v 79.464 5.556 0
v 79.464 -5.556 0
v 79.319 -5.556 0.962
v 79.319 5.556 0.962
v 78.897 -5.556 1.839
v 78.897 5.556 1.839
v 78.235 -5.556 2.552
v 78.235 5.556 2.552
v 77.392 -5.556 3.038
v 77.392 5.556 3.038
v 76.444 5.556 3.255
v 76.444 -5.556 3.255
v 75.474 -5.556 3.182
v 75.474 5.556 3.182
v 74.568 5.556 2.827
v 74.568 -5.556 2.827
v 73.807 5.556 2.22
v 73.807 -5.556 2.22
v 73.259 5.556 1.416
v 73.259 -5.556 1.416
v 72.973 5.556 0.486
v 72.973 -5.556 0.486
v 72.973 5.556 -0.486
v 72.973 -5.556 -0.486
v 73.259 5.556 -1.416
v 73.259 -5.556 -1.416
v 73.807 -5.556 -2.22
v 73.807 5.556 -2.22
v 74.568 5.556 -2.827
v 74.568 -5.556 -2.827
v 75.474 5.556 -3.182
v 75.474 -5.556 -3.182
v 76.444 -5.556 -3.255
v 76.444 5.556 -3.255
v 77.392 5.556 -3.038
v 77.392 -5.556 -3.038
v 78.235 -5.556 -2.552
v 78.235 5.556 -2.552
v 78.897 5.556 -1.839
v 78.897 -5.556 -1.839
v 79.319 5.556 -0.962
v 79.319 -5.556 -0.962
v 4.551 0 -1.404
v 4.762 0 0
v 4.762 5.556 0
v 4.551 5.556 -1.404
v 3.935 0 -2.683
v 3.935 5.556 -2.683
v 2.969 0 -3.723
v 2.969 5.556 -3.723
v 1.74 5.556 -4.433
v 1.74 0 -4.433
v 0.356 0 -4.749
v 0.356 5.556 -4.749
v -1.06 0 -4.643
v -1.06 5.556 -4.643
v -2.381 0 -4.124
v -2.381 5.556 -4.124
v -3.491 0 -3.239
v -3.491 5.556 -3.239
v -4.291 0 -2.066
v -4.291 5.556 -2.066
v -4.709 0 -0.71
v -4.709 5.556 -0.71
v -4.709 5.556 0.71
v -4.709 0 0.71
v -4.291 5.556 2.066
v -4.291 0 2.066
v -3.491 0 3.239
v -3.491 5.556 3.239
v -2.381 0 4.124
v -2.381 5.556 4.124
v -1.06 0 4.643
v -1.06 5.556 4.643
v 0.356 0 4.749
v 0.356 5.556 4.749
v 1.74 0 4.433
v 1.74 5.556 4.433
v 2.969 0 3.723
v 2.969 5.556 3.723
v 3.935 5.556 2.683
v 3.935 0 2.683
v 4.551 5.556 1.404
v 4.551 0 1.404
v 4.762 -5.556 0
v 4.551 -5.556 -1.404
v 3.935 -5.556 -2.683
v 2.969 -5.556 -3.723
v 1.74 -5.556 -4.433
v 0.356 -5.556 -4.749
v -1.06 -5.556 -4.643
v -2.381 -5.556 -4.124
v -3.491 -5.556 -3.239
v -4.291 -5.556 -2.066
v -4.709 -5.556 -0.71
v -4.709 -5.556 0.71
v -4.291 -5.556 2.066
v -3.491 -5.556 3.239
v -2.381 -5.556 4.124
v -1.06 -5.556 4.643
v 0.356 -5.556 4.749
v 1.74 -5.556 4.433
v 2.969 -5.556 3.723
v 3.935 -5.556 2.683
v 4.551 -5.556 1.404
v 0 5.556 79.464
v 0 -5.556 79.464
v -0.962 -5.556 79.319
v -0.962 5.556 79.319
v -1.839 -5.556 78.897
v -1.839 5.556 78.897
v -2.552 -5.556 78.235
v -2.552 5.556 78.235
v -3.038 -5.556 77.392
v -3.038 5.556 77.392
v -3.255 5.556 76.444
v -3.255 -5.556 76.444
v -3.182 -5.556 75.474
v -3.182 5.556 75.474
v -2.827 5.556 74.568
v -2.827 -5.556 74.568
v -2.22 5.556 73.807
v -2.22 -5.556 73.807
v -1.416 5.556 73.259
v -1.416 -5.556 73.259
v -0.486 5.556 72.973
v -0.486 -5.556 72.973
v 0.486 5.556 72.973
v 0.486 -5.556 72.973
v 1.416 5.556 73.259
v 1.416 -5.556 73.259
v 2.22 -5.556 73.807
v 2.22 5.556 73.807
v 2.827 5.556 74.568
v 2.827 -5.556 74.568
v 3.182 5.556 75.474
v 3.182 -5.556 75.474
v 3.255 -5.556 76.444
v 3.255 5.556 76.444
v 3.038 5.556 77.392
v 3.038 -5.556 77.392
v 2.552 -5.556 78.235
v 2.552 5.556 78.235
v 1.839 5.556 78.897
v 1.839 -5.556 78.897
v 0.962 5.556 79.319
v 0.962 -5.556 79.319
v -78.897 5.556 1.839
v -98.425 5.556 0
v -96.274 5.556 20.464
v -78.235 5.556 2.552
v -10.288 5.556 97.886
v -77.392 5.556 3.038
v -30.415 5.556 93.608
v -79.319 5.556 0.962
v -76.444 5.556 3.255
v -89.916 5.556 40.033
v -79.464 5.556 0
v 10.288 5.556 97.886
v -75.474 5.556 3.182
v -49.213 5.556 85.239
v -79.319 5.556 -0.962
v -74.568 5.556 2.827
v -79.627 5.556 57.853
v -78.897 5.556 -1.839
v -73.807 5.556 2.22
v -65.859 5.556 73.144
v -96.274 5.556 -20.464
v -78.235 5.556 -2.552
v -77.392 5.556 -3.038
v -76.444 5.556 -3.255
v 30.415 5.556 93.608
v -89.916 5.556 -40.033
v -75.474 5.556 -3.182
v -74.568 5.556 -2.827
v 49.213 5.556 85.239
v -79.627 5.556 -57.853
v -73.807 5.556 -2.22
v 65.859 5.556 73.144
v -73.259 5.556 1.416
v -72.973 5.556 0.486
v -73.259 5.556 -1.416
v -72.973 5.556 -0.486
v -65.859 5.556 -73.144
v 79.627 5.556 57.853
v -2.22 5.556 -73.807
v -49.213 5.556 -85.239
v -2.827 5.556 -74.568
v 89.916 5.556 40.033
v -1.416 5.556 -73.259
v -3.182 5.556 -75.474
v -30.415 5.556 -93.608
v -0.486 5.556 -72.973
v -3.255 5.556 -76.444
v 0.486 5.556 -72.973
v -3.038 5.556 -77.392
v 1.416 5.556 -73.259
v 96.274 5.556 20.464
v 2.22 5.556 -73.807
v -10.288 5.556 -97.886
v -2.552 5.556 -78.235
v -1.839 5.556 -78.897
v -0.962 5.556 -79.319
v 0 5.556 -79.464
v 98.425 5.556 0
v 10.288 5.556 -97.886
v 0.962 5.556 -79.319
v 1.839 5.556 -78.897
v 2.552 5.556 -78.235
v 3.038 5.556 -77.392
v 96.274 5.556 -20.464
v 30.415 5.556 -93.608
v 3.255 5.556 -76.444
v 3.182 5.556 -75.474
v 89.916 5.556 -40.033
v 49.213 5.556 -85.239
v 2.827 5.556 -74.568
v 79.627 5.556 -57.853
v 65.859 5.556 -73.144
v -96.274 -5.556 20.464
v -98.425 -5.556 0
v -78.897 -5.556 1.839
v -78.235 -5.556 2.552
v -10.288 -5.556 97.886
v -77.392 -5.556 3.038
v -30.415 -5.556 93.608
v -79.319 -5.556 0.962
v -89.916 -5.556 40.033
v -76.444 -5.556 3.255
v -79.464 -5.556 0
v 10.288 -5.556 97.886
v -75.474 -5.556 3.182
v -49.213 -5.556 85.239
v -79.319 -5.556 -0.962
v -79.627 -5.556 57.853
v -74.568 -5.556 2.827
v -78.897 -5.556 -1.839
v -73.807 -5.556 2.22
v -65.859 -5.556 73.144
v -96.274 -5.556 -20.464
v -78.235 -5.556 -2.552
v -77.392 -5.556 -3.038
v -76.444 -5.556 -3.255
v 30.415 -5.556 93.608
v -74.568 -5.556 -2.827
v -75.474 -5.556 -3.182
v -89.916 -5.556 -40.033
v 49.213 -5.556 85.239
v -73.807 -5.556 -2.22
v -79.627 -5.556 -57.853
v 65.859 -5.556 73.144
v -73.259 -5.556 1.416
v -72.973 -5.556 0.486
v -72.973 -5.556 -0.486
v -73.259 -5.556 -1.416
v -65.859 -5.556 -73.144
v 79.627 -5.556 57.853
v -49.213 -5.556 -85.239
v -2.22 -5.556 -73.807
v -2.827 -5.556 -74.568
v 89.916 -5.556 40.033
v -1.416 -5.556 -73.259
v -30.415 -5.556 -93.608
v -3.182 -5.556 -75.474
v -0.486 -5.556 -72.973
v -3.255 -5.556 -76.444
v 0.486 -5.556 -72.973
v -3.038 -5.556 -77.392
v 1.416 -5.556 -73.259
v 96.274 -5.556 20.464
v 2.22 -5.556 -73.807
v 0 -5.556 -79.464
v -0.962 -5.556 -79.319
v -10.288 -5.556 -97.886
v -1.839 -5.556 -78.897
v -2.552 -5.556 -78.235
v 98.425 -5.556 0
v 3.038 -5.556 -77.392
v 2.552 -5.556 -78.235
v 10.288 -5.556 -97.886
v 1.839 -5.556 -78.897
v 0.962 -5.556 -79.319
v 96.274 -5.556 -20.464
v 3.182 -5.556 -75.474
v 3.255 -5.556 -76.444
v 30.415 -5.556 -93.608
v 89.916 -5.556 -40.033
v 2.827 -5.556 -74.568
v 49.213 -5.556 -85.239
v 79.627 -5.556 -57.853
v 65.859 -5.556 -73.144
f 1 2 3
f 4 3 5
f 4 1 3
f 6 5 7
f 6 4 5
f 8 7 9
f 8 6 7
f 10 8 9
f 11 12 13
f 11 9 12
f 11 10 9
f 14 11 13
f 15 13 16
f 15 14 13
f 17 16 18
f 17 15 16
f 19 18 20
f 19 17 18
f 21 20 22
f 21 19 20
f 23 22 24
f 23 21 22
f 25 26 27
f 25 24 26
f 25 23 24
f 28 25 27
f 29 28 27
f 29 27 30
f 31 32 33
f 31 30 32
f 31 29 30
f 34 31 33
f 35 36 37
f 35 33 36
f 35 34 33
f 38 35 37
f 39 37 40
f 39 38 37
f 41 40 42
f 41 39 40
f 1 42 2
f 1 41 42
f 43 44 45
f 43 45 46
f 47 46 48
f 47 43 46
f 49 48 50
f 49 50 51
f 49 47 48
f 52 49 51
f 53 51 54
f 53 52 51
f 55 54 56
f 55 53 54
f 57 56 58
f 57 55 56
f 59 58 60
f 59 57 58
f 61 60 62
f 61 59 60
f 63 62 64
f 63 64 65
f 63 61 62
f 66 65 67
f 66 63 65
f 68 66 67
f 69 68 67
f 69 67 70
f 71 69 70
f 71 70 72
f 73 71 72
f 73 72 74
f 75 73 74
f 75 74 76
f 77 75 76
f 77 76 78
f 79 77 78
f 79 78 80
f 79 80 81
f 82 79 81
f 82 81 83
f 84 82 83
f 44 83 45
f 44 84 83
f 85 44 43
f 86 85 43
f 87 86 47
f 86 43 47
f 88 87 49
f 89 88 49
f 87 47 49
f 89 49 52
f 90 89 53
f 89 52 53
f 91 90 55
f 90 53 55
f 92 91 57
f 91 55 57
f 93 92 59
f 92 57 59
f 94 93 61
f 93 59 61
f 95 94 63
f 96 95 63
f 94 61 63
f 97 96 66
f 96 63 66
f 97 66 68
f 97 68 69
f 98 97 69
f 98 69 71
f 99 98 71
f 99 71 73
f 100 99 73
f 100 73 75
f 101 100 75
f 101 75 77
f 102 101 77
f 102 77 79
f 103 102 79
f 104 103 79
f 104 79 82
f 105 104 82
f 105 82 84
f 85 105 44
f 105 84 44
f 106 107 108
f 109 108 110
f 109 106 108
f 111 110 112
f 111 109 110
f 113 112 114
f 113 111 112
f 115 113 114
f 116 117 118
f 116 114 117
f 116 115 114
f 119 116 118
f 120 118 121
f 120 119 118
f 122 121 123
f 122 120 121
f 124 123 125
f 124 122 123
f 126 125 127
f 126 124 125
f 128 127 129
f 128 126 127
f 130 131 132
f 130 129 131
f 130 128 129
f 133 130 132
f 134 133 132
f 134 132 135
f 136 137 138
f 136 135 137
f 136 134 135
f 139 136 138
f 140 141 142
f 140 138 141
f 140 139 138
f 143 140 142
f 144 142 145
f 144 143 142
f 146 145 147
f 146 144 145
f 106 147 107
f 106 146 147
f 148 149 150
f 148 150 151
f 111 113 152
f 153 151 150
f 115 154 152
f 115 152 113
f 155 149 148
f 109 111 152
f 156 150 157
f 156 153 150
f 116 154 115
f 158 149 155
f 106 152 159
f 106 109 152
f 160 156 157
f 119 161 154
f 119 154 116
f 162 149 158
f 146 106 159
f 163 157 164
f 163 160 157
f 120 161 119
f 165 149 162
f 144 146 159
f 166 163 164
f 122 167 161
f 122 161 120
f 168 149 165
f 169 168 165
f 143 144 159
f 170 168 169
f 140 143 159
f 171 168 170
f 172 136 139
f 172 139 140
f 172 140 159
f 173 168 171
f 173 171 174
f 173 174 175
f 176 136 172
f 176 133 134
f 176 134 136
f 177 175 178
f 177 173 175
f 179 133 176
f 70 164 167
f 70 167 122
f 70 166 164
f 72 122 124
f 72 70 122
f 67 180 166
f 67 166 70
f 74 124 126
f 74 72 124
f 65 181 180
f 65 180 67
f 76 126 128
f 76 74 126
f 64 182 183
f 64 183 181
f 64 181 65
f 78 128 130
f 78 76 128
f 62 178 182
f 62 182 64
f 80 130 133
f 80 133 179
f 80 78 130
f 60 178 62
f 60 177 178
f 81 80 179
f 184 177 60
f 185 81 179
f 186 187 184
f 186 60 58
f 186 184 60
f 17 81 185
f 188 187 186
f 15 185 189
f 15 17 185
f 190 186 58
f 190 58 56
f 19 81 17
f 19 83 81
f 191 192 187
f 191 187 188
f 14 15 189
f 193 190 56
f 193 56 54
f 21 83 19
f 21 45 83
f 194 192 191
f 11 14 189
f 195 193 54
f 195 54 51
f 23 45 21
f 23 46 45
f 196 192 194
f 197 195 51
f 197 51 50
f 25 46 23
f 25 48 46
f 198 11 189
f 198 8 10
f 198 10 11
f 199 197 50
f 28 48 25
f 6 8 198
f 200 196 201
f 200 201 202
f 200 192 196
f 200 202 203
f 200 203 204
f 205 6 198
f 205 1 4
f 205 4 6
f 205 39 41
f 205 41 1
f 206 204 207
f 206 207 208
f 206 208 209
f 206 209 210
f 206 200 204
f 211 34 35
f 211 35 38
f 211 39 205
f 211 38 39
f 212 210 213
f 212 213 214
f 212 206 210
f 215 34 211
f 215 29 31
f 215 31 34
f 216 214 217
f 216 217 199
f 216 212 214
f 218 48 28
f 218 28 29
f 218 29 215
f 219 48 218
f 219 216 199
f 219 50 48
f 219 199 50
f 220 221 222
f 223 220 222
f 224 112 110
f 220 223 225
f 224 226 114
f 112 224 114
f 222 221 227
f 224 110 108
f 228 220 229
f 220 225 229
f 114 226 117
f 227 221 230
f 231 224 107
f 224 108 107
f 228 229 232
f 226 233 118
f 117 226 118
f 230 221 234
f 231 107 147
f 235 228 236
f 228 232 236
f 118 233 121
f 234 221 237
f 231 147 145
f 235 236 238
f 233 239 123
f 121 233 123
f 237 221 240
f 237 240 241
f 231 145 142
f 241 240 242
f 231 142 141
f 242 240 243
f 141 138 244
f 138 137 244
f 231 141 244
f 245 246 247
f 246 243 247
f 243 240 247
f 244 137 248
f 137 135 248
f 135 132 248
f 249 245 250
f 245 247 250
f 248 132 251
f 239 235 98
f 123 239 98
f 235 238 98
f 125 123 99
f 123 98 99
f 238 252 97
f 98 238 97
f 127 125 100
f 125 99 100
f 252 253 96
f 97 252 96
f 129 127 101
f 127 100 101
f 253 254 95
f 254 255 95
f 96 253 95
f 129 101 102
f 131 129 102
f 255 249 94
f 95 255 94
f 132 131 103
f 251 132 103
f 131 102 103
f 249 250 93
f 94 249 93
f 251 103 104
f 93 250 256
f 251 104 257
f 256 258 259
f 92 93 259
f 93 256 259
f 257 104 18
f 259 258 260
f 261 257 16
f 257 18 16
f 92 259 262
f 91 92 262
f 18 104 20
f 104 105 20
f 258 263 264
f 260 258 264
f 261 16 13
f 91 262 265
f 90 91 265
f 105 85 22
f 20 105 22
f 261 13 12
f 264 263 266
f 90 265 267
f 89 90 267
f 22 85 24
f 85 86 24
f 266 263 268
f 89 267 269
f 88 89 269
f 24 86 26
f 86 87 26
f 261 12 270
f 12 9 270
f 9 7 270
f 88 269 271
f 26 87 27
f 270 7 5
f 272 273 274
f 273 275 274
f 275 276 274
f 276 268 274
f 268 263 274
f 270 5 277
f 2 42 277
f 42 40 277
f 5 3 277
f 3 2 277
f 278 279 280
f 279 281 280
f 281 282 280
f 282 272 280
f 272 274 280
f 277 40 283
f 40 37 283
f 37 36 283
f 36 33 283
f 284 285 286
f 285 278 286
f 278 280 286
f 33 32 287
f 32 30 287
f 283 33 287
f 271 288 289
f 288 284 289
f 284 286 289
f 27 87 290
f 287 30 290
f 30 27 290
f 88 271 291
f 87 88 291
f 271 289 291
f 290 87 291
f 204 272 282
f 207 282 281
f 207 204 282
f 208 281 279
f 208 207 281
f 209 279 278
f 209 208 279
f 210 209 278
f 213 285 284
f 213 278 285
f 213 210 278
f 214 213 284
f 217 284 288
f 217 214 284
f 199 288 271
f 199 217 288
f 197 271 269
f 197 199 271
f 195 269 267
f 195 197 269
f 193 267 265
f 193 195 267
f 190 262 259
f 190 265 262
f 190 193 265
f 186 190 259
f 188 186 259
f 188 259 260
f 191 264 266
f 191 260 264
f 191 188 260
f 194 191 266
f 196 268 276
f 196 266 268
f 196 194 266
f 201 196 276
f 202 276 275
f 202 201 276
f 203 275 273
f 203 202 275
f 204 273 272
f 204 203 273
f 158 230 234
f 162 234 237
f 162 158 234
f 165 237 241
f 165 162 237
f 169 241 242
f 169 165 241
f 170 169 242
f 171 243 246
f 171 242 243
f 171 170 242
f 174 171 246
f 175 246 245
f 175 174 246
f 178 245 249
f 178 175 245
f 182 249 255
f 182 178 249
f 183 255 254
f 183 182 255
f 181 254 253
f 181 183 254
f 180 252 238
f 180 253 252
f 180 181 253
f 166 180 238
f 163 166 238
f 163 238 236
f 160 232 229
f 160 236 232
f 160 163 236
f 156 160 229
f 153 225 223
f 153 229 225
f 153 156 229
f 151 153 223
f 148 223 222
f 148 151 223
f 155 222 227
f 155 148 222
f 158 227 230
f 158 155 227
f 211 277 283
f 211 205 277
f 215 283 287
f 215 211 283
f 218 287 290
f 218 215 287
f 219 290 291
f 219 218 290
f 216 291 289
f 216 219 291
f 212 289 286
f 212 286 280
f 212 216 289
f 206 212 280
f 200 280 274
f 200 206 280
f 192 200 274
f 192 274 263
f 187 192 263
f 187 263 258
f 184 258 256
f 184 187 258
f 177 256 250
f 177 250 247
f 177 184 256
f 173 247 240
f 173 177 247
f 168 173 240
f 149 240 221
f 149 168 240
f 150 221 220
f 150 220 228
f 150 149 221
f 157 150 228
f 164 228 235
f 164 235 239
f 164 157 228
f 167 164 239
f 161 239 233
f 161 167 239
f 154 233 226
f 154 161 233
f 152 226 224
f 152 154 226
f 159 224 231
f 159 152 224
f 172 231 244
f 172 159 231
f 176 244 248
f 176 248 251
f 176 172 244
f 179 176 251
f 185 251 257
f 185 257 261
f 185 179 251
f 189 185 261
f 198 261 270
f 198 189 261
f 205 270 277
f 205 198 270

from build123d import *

# Parameters (mm, degrees)
SKETCH1_R                = 98.425
SKETCH1_R_2              = 4.7625
BOSS_EXTRUDE1_DEPTH      = 5.55625
BOSS_EXTRUDE1_DEPTH_BACK = 5.55625
CIRPATTERN1_COUNT        = 4


with BuildPart() as part:
    # Sketch1 → Boss-Extrude1 (new body, two sides)
    with BuildSketch(Plane(origin=(0, 0, 0), x_dir=(1, 0, 0), z_dir=(0, 1, 0))) as boss_extrude1_sk:
        Circle(SKETCH1_R)
        Circle(SKETCH1_R_2, mode=Mode.SUBTRACT)
    extrude(amount=BOSS_EXTRUDE1_DEPTH)
    extrude(boss_extrude1_sk.sketch, amount=-BOSS_EXTRUDE1_DEPTH_BACK)

    # Sketch2 → 1/4 Clearance Hole1 (revolve, cut)
    with BuildSketch(Plane(origin=(0, 5.55625, 76.2), x_dir=(0, 0, 1), z_dir=(1, 0, 0))):
        Polygon((0, 0), (0, 14.661148974), (3.2639, 12.7), (3.2639, 0), align=None)
    f_1_4_clearance_hole1 = revolve(axis=Axis((0, 11.90625, 76.2), (0, -1, 0)), mode=Mode.SUBTRACT)

    # CirPattern1: 1/4 Clearance Hole1 ×4 about axis
    cirpattern1_axis = Axis((0, 0, 0), (0, 1, 0))
    for i in range(1, CIRPATTERN1_COUNT):
        add(f_1_4_clearance_hole1.rotate(cirpattern1_axis, i * 360 / CIRPATTERN1_COUNT), mode=Mode.SUBTRACT)


solid = part.part
